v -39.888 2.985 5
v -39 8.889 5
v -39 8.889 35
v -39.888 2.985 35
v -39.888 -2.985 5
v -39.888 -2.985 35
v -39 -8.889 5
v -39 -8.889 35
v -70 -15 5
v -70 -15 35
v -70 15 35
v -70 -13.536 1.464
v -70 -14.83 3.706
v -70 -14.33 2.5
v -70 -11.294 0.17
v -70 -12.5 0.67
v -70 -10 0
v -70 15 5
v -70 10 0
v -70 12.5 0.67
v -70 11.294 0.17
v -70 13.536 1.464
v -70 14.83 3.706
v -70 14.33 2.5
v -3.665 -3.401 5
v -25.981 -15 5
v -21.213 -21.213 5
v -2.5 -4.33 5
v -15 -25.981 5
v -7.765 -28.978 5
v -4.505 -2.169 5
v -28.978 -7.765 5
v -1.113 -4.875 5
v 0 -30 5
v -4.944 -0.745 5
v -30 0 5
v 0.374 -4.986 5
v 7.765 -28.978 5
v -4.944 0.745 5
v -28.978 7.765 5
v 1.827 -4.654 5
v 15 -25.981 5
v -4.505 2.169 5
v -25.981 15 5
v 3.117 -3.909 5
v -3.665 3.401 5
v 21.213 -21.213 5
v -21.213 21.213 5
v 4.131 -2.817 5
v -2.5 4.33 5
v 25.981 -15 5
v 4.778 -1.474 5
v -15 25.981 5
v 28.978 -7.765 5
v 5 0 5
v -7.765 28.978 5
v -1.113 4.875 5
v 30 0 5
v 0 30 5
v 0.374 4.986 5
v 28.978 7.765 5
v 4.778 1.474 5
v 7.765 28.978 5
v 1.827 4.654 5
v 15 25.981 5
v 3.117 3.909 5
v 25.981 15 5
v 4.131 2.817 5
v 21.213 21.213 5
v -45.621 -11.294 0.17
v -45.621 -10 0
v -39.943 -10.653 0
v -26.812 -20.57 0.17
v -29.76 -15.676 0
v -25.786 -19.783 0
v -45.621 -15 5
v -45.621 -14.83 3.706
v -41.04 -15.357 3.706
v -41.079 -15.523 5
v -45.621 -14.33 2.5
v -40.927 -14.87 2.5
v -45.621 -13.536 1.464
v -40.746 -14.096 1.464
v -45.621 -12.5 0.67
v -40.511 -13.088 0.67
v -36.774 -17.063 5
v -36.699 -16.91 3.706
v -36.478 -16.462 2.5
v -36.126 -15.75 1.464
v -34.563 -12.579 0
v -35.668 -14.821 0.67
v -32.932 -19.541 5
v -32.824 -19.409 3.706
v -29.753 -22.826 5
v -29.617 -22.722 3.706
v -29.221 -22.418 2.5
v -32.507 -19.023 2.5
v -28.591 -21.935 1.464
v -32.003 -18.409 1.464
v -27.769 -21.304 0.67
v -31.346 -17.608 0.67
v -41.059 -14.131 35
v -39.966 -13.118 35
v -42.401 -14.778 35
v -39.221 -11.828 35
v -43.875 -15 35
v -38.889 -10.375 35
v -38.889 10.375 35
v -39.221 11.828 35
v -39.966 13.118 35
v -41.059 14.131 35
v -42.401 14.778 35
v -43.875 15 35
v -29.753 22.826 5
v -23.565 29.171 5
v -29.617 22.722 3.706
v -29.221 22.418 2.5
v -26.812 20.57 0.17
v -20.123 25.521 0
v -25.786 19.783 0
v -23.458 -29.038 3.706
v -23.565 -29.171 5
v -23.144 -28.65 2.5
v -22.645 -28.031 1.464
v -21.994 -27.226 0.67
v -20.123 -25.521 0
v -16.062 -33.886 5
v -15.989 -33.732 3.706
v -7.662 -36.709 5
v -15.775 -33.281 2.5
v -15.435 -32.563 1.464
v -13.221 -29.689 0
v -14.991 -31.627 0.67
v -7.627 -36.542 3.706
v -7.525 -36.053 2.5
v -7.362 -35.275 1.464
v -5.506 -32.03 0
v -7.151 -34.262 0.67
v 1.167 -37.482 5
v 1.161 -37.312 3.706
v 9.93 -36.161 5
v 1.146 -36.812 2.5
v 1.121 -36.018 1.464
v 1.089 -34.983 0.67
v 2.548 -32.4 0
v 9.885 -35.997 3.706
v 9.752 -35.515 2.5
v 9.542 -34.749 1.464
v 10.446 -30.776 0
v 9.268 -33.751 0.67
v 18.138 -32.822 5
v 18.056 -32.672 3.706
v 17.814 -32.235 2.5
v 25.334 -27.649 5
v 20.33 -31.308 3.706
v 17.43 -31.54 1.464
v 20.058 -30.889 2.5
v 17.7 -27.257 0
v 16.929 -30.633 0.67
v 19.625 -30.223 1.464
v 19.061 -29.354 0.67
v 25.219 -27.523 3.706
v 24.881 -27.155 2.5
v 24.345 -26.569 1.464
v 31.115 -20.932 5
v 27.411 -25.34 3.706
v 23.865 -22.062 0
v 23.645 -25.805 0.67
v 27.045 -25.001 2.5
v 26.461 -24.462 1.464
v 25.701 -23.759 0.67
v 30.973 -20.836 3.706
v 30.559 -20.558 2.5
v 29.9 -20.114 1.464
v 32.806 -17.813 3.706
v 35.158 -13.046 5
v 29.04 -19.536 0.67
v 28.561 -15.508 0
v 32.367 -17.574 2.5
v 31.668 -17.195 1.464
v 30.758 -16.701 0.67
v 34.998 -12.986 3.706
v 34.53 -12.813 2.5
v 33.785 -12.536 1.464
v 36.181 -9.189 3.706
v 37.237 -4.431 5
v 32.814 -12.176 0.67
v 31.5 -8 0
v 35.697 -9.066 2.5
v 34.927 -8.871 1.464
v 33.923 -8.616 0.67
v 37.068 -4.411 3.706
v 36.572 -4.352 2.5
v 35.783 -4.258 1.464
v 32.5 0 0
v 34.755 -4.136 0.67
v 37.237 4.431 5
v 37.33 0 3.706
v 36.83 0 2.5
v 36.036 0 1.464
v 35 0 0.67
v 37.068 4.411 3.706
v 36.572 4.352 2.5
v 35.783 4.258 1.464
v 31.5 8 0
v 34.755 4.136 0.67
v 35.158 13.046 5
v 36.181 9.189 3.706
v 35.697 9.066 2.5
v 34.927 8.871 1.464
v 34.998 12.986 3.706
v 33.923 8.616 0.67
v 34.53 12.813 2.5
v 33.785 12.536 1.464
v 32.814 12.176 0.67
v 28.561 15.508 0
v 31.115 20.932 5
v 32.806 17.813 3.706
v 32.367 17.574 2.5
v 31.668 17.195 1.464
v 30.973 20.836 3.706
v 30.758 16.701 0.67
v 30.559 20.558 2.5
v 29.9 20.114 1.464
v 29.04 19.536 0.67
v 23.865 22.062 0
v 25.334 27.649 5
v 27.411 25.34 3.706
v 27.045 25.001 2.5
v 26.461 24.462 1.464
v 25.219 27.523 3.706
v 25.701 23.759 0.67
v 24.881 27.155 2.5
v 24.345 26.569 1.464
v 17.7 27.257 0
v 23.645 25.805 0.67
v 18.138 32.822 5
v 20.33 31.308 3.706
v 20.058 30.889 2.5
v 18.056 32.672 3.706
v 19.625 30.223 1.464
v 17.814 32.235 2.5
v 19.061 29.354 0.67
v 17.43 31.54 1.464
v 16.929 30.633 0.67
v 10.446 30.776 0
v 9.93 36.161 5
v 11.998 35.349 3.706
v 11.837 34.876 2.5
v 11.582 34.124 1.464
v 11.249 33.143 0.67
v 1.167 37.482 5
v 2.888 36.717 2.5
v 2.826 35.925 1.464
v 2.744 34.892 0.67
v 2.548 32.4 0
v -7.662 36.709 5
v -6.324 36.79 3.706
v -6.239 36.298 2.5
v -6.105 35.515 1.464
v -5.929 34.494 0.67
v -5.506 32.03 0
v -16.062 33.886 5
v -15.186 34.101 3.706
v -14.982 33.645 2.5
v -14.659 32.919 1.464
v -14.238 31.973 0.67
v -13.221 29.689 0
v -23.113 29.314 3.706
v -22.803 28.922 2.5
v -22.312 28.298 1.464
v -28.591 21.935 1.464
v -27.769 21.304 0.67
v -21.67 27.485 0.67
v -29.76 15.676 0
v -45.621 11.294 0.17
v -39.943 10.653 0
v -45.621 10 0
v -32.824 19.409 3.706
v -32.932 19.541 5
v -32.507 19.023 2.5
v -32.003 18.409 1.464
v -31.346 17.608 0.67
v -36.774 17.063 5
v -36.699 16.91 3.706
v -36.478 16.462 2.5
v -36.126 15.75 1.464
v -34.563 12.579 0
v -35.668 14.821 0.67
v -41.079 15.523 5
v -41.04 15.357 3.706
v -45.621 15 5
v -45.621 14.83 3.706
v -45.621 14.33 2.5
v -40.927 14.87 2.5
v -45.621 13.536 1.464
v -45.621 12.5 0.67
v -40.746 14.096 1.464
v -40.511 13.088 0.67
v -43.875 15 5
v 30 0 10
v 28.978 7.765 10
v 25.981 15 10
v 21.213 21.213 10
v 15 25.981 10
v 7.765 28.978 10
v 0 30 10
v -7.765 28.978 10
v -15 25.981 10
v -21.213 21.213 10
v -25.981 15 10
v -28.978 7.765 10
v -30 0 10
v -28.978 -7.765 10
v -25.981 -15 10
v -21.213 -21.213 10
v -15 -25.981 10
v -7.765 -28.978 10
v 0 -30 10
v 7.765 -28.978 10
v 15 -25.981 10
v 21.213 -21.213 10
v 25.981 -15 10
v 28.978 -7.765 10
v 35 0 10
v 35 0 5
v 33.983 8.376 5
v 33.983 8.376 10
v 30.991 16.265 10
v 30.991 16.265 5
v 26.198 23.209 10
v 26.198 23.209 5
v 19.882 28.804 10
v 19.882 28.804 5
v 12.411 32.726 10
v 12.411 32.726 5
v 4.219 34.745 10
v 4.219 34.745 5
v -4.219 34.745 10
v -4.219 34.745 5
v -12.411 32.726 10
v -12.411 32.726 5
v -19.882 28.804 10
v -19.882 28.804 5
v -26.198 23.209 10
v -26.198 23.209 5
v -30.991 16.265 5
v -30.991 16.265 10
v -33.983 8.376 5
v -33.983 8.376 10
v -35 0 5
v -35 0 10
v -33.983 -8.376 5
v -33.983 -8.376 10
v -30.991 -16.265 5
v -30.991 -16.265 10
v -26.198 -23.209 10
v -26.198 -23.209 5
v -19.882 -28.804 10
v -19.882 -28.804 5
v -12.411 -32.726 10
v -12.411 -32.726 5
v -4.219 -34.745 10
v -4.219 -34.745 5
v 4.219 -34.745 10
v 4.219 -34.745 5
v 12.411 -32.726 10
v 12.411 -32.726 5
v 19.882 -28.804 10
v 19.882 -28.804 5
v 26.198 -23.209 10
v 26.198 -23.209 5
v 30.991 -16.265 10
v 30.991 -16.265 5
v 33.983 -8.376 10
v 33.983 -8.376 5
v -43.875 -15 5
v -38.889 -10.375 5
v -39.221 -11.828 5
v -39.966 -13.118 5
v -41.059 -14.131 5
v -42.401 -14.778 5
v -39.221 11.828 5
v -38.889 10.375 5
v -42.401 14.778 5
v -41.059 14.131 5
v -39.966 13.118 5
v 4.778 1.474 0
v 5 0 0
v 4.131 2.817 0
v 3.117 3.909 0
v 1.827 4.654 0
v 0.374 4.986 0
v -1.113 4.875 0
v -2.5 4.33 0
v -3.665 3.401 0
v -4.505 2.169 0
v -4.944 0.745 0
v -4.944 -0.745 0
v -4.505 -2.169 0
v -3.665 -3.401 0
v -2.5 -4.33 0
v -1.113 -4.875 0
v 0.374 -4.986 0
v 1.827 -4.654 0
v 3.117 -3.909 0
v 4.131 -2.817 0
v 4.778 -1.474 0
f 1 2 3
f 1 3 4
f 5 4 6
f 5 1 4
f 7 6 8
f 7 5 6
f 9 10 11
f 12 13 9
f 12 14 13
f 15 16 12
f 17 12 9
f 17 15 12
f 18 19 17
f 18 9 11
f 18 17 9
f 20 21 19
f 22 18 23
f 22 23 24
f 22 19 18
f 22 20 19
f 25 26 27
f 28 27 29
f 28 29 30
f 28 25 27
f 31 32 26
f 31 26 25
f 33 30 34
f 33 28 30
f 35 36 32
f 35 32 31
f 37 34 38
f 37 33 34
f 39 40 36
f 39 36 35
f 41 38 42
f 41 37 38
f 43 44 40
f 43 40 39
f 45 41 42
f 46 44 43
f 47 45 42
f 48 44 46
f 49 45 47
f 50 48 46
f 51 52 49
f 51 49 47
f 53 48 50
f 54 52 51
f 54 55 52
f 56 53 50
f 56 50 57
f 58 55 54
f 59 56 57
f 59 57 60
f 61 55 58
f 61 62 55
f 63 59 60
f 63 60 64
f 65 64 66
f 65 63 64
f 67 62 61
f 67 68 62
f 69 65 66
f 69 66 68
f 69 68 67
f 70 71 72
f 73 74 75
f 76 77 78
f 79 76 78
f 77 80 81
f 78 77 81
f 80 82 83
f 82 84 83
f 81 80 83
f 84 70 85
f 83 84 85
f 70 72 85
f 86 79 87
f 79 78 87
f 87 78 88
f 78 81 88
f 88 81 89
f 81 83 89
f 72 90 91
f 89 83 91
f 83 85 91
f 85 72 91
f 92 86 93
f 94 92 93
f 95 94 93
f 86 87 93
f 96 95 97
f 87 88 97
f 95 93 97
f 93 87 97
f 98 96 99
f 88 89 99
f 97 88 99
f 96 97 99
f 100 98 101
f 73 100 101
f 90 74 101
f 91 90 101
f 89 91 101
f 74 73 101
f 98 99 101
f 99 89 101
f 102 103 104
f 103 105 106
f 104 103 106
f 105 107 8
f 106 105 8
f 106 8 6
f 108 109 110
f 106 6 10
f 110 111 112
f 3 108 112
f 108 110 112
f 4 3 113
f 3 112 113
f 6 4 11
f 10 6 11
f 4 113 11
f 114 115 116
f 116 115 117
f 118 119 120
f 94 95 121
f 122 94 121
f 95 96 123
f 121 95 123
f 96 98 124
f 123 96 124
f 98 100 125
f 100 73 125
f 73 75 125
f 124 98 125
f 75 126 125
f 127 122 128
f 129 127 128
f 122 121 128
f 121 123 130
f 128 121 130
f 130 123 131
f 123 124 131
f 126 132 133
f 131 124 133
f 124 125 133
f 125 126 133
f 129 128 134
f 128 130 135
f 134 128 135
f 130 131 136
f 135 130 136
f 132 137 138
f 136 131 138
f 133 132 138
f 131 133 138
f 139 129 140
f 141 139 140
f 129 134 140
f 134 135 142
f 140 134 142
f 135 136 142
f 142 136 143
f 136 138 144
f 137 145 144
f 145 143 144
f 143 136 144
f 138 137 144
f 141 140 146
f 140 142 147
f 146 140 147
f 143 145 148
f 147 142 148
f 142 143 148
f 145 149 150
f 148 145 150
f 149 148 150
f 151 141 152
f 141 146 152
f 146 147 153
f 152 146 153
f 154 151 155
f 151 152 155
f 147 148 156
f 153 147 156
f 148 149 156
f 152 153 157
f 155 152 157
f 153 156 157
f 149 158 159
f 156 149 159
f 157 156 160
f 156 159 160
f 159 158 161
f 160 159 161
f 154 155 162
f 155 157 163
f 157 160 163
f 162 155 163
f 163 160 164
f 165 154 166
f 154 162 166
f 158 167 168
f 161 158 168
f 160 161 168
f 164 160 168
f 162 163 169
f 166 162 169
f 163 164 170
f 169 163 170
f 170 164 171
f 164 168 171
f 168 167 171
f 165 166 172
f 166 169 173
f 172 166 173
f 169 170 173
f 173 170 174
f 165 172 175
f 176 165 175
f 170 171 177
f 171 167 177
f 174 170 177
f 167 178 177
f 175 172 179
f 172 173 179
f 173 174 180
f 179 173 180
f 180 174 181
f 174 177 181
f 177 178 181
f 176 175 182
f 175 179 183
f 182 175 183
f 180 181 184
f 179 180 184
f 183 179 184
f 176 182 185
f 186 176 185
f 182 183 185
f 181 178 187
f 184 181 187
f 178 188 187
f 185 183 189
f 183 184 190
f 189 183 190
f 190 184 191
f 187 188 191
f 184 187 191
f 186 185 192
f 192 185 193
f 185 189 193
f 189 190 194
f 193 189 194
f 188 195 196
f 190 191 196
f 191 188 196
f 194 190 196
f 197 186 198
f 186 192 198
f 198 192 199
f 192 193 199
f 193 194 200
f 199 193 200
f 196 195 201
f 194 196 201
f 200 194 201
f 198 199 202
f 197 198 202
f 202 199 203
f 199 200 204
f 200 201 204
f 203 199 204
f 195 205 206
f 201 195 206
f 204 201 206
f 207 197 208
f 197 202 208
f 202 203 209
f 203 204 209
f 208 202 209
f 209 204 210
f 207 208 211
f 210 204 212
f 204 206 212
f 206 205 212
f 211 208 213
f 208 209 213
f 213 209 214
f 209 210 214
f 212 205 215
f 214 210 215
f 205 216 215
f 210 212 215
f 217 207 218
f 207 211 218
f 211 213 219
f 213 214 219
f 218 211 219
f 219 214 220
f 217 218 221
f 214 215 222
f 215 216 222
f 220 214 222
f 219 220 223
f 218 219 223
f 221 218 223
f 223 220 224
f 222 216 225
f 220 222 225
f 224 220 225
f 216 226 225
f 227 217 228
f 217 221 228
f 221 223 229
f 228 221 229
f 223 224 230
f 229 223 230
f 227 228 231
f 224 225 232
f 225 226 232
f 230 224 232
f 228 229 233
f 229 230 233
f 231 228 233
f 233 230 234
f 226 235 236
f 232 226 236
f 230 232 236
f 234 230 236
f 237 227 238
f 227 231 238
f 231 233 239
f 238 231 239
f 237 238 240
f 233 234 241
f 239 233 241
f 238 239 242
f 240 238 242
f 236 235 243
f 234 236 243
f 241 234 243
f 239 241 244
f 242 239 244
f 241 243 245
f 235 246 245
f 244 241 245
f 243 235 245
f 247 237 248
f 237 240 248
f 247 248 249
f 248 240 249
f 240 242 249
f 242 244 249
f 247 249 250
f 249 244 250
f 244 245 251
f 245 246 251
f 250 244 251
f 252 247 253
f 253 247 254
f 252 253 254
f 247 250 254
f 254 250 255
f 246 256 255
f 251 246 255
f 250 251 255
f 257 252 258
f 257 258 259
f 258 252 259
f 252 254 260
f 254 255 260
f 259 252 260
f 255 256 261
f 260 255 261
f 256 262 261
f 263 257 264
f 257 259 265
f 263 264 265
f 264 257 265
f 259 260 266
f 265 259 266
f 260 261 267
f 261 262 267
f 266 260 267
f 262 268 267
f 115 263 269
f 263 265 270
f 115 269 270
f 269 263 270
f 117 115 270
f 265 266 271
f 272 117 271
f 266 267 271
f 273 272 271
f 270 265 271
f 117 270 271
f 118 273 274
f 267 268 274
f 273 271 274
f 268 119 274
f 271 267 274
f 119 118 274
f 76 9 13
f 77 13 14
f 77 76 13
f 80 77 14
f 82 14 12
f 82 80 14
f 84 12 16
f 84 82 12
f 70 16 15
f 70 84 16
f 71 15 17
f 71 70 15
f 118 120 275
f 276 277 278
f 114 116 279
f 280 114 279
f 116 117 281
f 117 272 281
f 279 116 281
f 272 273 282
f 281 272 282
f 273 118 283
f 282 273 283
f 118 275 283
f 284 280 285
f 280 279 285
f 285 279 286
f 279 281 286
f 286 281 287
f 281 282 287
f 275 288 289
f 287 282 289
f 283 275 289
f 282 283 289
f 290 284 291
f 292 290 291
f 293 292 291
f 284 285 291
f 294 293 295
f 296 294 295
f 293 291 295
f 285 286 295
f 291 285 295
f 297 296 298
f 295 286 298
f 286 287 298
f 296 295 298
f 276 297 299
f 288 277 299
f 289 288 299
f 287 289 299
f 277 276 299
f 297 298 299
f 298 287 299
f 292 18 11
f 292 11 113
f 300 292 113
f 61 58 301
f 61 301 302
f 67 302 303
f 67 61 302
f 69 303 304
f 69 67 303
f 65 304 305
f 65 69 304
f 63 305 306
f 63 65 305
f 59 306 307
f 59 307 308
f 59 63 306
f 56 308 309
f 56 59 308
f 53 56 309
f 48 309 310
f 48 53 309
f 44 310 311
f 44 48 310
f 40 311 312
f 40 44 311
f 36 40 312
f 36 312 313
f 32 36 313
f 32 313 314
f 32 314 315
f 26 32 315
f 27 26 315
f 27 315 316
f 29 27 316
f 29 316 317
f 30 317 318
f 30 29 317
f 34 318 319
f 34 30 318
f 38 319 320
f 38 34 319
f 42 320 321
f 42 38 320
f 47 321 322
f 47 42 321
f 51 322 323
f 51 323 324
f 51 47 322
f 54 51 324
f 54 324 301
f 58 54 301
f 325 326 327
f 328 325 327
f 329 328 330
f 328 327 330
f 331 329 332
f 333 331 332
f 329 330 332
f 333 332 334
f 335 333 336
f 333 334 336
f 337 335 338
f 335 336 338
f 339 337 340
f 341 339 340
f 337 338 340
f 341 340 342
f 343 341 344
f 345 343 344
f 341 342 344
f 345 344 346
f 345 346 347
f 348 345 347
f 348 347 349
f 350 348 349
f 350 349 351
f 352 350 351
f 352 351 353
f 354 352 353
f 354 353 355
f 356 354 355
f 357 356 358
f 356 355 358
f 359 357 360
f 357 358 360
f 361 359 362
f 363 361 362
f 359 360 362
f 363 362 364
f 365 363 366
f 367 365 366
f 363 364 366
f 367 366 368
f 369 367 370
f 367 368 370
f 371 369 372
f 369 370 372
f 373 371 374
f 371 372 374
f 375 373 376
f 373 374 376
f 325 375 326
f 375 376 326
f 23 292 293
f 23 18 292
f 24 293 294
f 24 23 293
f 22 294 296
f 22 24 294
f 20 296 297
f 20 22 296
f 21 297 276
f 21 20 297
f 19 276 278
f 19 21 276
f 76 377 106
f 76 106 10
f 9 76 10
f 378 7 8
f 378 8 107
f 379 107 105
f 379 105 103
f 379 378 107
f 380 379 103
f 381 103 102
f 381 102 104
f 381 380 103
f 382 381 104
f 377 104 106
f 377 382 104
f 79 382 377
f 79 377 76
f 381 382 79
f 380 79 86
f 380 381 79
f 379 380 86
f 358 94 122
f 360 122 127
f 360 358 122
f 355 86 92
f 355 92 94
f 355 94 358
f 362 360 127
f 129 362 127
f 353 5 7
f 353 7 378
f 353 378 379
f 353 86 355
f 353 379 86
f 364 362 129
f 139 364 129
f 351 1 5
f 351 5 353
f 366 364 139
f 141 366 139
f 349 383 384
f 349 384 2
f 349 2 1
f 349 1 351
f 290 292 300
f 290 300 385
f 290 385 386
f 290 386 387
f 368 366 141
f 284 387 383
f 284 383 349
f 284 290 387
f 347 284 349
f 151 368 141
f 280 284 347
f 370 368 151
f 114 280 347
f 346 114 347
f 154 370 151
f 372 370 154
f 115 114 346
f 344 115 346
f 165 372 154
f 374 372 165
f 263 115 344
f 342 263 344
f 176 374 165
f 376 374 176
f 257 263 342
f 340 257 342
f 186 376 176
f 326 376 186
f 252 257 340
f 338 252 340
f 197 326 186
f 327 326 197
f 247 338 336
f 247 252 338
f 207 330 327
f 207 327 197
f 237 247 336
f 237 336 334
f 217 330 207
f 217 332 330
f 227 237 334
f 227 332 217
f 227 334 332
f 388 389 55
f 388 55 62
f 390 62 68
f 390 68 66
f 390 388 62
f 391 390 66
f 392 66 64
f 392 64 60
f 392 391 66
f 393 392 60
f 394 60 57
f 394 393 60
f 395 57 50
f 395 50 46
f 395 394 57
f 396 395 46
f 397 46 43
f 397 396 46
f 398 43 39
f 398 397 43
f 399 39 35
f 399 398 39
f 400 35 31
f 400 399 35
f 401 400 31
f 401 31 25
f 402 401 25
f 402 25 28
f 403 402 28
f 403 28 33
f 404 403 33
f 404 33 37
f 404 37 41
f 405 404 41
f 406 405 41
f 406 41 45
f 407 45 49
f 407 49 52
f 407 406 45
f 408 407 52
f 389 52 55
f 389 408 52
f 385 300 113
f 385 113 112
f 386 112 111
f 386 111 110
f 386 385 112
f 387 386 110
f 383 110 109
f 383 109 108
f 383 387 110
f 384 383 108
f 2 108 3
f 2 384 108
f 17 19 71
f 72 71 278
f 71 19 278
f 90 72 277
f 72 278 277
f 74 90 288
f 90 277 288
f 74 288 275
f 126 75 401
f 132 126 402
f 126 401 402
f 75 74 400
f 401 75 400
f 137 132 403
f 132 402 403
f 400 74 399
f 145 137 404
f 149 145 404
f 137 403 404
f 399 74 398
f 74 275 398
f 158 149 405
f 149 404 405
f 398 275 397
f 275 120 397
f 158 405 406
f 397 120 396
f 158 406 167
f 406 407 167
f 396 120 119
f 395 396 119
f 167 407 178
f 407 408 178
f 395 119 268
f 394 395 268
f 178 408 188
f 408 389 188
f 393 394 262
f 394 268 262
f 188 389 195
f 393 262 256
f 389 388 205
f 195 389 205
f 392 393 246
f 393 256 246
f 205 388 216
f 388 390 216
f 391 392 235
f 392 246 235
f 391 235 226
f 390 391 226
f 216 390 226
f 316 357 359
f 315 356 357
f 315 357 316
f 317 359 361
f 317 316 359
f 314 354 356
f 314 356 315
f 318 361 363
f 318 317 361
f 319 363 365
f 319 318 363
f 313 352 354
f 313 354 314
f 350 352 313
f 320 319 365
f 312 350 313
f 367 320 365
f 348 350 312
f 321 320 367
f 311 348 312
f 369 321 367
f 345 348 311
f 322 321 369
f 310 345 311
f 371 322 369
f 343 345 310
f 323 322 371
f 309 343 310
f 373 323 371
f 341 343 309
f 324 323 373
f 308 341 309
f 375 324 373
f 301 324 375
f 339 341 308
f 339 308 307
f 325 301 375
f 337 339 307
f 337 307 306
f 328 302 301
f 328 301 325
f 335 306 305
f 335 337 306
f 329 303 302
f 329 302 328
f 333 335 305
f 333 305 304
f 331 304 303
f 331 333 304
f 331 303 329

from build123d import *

# Parameters (mm, degrees)
ESQUISSE1_R        = 5
BOSS_EXTRU_1_DEPTH = 5
ESQUISSE6_R        = 35
ESQUISSE6_R_2      = 30
BOSS_EXTRU_6_DEPTH = 5
BOSS_EXTRU_9_DEPTH = 30
CONG_3_R           = 5


with BuildPart() as part:
    # Esquisse1 → Boss.-Extru.1 (new body)
    with BuildSketch(Plane.XY):
        with BuildLine():
            Line((-45.620718977, 15), (-70, 15))
            Line((-70, 15), (-70, -15))
            Line((-70, -15), (-45.620718977, -15))
            ThreePointArc((-45.620718977, -15), (-36.774201608, -17.062911874), (-29.752642811, -22.826086957))
            ThreePointArc((-29.752642811, -22.826086957), (37.5, 0), (-29.752642811, 22.826086957))
            ThreePointArc((-29.752642811, 22.826086957), (-36.774201608, 17.062911874), (-45.620718977, 15))
        make_face()
        Circle(ESQUISSE1_R, mode=Mode.SUBTRACT)
    extrude(amount=BOSS_EXTRU_1_DEPTH)

    # Esquisse6 → Boss.-Extru.6 (add)
    with BuildSketch(Plane.XY.offset(5)):
        Circle(ESQUISSE6_R)
        Circle(ESQUISSE6_R_2, mode=Mode.SUBTRACT)
    extrude(amount=BOSS_EXTRU_6_DEPTH)

    # Esquisse8 → Boss.-Extru.9 (add)
    with BuildSketch(Plane.XY.offset(5)):
        with BuildLine():
            Line((-70, -15), (-70, 15))
            Line((-70, 15), (-43.874821937, 15))
            ThreePointArc((-43.874821937, 15), (-39.966142137, 13.118047822), (-38.999841722, 8.888888889))
            ThreePointArc((-38.999841722, 8.888888889), (-40, 0), (-38.999841722, -8.888888889))
            ThreePointArc((-38.999841722, -8.888888889), (-39.966142137, -13.118047822), (-43.874821937, -15))
            Line((-43.874821937, -15), (-70, -15))
        make_face()
    extrude(amount=BOSS_EXTRU_9_DEPTH)

    # Congé3
    cong_3_edges = [part.edges().sort_by_distance(p)[0] for p in [
        (37.5, 0, 0),
        (-57.810359489, 15, 0),
        (-57.810359489, -15, 0),
        (-36.774201608, -17.062911874, 0),
        (-36.774201608, 17.062911874, 0),
    ]]
    fillet(cong_3_edges, radius=CONG_3_R - 0.0001)  # a hair under: the kernel refuses the full size


solid = part.part
